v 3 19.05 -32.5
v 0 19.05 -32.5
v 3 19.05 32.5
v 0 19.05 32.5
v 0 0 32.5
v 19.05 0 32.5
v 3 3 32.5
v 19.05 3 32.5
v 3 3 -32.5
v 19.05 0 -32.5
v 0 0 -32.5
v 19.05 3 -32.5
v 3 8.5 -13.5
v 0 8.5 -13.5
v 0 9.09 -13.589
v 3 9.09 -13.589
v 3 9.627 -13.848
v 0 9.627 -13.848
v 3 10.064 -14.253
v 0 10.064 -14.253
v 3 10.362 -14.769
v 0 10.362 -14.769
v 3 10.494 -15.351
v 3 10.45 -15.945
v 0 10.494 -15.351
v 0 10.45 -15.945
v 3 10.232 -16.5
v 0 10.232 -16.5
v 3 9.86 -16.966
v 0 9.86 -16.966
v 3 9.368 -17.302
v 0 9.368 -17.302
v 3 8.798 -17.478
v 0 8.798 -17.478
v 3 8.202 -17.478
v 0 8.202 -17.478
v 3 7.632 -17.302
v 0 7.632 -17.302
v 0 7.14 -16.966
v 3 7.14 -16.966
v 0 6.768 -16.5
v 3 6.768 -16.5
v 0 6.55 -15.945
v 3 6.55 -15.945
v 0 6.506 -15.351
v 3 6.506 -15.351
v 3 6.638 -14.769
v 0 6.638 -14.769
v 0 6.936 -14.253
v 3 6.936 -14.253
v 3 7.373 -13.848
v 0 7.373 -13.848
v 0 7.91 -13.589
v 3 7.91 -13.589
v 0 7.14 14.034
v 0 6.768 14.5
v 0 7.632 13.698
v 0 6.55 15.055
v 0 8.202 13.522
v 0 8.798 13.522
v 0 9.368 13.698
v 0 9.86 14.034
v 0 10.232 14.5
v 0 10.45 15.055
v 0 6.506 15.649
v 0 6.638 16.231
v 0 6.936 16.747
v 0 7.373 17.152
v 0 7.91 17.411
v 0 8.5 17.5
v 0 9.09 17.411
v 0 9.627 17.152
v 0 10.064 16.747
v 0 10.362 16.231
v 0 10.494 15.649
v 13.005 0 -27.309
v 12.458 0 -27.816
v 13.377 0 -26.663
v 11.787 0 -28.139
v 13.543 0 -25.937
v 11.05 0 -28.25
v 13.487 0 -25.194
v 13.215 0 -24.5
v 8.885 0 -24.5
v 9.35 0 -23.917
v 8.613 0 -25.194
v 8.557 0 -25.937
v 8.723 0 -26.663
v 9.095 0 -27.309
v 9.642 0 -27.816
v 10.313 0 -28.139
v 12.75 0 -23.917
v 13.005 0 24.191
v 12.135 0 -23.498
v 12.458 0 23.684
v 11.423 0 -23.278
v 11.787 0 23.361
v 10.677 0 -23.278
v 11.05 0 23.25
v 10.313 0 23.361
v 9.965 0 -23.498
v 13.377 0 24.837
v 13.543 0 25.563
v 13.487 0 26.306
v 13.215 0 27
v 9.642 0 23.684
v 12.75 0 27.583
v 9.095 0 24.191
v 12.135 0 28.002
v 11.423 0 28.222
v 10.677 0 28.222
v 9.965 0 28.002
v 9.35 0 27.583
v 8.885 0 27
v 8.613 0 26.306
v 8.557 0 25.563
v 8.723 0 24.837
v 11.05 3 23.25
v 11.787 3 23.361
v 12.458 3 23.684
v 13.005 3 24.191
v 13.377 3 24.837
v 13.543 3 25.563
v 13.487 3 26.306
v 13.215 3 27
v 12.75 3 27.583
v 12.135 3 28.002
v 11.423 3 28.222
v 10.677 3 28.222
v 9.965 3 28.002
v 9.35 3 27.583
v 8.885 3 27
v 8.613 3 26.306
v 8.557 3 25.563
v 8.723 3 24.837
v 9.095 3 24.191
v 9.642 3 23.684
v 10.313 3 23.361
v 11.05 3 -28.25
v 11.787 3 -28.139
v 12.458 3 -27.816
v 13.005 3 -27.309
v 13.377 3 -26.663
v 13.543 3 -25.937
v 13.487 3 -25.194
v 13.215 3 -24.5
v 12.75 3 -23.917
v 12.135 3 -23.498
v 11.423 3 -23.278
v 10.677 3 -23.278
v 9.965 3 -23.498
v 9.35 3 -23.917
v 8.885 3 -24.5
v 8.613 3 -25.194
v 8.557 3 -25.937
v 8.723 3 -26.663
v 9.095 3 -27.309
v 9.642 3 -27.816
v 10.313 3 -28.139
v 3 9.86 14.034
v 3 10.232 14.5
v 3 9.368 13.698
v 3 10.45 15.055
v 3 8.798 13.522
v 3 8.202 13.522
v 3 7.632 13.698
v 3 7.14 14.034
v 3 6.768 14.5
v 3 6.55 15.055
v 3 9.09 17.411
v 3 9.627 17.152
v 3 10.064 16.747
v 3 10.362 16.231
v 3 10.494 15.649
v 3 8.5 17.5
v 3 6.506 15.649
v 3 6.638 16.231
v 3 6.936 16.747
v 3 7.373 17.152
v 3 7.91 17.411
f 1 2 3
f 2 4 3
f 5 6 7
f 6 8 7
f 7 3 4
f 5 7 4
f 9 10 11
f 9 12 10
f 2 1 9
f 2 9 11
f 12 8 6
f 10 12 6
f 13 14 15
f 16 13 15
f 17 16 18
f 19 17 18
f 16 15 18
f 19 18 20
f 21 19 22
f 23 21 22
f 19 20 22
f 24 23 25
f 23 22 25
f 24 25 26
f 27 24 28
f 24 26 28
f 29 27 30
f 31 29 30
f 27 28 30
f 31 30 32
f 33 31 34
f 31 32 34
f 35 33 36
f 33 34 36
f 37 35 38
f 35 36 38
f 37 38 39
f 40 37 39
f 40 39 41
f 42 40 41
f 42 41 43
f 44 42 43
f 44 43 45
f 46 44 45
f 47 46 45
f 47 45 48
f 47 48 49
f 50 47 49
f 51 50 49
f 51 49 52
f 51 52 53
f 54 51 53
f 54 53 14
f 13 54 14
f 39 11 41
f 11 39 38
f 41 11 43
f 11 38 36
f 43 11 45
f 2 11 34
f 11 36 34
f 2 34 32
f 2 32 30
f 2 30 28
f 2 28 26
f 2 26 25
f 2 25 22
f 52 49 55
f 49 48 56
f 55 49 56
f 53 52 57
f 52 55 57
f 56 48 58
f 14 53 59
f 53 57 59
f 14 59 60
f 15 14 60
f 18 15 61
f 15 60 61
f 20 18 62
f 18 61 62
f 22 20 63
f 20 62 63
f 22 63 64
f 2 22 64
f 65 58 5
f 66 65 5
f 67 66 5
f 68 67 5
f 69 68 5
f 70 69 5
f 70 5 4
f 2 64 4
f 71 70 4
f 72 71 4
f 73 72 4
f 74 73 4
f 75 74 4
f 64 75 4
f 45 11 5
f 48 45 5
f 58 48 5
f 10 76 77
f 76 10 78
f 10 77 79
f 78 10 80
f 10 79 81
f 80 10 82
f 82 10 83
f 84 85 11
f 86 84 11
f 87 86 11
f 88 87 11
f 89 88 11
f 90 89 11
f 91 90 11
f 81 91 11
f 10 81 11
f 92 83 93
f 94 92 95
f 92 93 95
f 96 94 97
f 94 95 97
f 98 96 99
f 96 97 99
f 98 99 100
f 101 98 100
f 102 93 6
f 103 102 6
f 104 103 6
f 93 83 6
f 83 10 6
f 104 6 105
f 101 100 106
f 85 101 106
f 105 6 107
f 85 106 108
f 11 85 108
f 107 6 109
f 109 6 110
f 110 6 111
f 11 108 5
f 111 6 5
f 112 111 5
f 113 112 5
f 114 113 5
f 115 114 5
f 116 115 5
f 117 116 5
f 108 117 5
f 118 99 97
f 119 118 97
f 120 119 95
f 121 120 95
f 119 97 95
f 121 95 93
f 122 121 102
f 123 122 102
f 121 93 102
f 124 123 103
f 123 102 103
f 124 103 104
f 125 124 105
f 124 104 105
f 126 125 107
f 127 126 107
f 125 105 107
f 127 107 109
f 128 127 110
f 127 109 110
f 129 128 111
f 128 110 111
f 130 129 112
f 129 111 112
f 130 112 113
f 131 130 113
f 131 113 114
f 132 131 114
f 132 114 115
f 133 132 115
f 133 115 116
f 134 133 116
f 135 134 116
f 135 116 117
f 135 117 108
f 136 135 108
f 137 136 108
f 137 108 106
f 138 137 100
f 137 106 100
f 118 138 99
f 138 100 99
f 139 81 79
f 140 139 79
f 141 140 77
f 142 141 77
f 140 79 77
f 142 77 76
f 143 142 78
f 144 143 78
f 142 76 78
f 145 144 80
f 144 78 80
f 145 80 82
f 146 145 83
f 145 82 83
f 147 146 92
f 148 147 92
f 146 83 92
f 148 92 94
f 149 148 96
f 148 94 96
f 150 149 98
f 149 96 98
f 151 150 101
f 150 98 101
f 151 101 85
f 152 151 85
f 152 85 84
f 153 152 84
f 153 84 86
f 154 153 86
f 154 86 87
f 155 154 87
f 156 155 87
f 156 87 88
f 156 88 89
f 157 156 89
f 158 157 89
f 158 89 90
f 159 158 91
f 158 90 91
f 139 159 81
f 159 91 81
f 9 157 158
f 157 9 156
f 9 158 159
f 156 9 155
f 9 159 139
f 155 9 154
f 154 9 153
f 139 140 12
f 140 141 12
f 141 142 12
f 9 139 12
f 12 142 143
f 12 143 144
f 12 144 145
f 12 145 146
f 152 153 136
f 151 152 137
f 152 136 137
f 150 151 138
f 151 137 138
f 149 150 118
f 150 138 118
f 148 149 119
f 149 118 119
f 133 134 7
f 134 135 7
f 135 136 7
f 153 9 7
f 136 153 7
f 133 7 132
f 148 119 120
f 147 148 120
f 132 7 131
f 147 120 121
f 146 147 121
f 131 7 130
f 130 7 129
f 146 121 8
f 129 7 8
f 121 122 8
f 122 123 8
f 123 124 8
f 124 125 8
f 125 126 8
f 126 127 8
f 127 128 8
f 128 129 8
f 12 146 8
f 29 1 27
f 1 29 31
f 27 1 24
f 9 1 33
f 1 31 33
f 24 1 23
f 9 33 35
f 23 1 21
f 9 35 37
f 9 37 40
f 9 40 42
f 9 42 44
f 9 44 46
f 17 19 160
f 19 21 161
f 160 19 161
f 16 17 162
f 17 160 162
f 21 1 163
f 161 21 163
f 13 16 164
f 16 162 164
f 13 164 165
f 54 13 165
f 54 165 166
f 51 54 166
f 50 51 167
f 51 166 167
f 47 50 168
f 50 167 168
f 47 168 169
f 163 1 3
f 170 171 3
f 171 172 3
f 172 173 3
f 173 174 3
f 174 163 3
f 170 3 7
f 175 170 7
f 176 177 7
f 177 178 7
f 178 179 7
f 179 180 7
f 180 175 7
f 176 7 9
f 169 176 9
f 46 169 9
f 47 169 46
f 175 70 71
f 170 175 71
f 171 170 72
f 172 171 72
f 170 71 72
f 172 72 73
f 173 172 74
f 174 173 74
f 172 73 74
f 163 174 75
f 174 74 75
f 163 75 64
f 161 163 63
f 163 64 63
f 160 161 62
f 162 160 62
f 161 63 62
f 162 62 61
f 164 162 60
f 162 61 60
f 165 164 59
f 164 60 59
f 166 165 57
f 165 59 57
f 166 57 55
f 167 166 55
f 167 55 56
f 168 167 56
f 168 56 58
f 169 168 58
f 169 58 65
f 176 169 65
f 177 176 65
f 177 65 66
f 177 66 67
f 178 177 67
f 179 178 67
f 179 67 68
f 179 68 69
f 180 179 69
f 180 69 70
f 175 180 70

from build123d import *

# Parameters (mm, degrees)
EXTRUDE_THIN1_DEPTH = 32.5
CUT_EXTRUDE2_REACH  = 44.214
SKETCH4_R           = 2
SKETCH3_R           = 2.5
CUT_EXTRUDE1_DEPTH  = 3


with BuildPart() as part:
    # Sketch1 → Extrude-Thin1 (new, symmetric)
    with BuildSketch(Plane.XY):
        Polygon((19.05, 0), (0, 0), (0, 19.05), (3, 19.05), (3, 3), (19.05, 3), align=None)
    extrude(amount=EXTRUDE_THIN1_DEPTH, both=True)

    # Sketch4 → Cut-Extrude2 (cut, up to next)
    with BuildSketch(Plane.ZY, mode=Mode.PRIVATE) as cut_extrude2_sk1:
        with Locations((-15.5, 8.5)):
            Circle(SKETCH4_R)
    cut_extrude2_tool1 = extrude(cut_extrude2_sk1.sketch, amount=-CUT_EXTRUDE2_REACH, mode=Mode.PRIVATE) & part.part
    # Sketch4 → Cut-Extrude2 (cut, up to next)
    with BuildSketch(Plane.ZY, mode=Mode.PRIVATE) as cut_extrude2_sk2:
        with Locations((15.5, 8.5)):
            Circle(SKETCH4_R)
    cut_extrude2_tool2 = extrude(cut_extrude2_sk2.sketch, amount=-CUT_EXTRUDE2_REACH, mode=Mode.PRIVATE) & part.part
    add(cut_extrude2_tool1.solids().sort_by_distance((0, 8.5, -15.5))[0], mode=Mode.SUBTRACT)
    add(cut_extrude2_tool2.solids().sort_by_distance((0, 8.5, 15.5))[0], mode=Mode.SUBTRACT)

    # Sketch3 → Cut-Extrude1 (cut)
    with BuildSketch(Plane.XZ):
        with Locations(Location((11.05, -25.75, 0), (0, 0, 270))):
            Circle(SKETCH3_R)
        with Locations(Location((11.05, 25.75, 0), (0, 0, 270))):
            Circle(SKETCH3_R)
    extrude(amount=-CUT_EXTRUDE1_DEPTH, mode=Mode.SUBTRACT)


solid = part.part
